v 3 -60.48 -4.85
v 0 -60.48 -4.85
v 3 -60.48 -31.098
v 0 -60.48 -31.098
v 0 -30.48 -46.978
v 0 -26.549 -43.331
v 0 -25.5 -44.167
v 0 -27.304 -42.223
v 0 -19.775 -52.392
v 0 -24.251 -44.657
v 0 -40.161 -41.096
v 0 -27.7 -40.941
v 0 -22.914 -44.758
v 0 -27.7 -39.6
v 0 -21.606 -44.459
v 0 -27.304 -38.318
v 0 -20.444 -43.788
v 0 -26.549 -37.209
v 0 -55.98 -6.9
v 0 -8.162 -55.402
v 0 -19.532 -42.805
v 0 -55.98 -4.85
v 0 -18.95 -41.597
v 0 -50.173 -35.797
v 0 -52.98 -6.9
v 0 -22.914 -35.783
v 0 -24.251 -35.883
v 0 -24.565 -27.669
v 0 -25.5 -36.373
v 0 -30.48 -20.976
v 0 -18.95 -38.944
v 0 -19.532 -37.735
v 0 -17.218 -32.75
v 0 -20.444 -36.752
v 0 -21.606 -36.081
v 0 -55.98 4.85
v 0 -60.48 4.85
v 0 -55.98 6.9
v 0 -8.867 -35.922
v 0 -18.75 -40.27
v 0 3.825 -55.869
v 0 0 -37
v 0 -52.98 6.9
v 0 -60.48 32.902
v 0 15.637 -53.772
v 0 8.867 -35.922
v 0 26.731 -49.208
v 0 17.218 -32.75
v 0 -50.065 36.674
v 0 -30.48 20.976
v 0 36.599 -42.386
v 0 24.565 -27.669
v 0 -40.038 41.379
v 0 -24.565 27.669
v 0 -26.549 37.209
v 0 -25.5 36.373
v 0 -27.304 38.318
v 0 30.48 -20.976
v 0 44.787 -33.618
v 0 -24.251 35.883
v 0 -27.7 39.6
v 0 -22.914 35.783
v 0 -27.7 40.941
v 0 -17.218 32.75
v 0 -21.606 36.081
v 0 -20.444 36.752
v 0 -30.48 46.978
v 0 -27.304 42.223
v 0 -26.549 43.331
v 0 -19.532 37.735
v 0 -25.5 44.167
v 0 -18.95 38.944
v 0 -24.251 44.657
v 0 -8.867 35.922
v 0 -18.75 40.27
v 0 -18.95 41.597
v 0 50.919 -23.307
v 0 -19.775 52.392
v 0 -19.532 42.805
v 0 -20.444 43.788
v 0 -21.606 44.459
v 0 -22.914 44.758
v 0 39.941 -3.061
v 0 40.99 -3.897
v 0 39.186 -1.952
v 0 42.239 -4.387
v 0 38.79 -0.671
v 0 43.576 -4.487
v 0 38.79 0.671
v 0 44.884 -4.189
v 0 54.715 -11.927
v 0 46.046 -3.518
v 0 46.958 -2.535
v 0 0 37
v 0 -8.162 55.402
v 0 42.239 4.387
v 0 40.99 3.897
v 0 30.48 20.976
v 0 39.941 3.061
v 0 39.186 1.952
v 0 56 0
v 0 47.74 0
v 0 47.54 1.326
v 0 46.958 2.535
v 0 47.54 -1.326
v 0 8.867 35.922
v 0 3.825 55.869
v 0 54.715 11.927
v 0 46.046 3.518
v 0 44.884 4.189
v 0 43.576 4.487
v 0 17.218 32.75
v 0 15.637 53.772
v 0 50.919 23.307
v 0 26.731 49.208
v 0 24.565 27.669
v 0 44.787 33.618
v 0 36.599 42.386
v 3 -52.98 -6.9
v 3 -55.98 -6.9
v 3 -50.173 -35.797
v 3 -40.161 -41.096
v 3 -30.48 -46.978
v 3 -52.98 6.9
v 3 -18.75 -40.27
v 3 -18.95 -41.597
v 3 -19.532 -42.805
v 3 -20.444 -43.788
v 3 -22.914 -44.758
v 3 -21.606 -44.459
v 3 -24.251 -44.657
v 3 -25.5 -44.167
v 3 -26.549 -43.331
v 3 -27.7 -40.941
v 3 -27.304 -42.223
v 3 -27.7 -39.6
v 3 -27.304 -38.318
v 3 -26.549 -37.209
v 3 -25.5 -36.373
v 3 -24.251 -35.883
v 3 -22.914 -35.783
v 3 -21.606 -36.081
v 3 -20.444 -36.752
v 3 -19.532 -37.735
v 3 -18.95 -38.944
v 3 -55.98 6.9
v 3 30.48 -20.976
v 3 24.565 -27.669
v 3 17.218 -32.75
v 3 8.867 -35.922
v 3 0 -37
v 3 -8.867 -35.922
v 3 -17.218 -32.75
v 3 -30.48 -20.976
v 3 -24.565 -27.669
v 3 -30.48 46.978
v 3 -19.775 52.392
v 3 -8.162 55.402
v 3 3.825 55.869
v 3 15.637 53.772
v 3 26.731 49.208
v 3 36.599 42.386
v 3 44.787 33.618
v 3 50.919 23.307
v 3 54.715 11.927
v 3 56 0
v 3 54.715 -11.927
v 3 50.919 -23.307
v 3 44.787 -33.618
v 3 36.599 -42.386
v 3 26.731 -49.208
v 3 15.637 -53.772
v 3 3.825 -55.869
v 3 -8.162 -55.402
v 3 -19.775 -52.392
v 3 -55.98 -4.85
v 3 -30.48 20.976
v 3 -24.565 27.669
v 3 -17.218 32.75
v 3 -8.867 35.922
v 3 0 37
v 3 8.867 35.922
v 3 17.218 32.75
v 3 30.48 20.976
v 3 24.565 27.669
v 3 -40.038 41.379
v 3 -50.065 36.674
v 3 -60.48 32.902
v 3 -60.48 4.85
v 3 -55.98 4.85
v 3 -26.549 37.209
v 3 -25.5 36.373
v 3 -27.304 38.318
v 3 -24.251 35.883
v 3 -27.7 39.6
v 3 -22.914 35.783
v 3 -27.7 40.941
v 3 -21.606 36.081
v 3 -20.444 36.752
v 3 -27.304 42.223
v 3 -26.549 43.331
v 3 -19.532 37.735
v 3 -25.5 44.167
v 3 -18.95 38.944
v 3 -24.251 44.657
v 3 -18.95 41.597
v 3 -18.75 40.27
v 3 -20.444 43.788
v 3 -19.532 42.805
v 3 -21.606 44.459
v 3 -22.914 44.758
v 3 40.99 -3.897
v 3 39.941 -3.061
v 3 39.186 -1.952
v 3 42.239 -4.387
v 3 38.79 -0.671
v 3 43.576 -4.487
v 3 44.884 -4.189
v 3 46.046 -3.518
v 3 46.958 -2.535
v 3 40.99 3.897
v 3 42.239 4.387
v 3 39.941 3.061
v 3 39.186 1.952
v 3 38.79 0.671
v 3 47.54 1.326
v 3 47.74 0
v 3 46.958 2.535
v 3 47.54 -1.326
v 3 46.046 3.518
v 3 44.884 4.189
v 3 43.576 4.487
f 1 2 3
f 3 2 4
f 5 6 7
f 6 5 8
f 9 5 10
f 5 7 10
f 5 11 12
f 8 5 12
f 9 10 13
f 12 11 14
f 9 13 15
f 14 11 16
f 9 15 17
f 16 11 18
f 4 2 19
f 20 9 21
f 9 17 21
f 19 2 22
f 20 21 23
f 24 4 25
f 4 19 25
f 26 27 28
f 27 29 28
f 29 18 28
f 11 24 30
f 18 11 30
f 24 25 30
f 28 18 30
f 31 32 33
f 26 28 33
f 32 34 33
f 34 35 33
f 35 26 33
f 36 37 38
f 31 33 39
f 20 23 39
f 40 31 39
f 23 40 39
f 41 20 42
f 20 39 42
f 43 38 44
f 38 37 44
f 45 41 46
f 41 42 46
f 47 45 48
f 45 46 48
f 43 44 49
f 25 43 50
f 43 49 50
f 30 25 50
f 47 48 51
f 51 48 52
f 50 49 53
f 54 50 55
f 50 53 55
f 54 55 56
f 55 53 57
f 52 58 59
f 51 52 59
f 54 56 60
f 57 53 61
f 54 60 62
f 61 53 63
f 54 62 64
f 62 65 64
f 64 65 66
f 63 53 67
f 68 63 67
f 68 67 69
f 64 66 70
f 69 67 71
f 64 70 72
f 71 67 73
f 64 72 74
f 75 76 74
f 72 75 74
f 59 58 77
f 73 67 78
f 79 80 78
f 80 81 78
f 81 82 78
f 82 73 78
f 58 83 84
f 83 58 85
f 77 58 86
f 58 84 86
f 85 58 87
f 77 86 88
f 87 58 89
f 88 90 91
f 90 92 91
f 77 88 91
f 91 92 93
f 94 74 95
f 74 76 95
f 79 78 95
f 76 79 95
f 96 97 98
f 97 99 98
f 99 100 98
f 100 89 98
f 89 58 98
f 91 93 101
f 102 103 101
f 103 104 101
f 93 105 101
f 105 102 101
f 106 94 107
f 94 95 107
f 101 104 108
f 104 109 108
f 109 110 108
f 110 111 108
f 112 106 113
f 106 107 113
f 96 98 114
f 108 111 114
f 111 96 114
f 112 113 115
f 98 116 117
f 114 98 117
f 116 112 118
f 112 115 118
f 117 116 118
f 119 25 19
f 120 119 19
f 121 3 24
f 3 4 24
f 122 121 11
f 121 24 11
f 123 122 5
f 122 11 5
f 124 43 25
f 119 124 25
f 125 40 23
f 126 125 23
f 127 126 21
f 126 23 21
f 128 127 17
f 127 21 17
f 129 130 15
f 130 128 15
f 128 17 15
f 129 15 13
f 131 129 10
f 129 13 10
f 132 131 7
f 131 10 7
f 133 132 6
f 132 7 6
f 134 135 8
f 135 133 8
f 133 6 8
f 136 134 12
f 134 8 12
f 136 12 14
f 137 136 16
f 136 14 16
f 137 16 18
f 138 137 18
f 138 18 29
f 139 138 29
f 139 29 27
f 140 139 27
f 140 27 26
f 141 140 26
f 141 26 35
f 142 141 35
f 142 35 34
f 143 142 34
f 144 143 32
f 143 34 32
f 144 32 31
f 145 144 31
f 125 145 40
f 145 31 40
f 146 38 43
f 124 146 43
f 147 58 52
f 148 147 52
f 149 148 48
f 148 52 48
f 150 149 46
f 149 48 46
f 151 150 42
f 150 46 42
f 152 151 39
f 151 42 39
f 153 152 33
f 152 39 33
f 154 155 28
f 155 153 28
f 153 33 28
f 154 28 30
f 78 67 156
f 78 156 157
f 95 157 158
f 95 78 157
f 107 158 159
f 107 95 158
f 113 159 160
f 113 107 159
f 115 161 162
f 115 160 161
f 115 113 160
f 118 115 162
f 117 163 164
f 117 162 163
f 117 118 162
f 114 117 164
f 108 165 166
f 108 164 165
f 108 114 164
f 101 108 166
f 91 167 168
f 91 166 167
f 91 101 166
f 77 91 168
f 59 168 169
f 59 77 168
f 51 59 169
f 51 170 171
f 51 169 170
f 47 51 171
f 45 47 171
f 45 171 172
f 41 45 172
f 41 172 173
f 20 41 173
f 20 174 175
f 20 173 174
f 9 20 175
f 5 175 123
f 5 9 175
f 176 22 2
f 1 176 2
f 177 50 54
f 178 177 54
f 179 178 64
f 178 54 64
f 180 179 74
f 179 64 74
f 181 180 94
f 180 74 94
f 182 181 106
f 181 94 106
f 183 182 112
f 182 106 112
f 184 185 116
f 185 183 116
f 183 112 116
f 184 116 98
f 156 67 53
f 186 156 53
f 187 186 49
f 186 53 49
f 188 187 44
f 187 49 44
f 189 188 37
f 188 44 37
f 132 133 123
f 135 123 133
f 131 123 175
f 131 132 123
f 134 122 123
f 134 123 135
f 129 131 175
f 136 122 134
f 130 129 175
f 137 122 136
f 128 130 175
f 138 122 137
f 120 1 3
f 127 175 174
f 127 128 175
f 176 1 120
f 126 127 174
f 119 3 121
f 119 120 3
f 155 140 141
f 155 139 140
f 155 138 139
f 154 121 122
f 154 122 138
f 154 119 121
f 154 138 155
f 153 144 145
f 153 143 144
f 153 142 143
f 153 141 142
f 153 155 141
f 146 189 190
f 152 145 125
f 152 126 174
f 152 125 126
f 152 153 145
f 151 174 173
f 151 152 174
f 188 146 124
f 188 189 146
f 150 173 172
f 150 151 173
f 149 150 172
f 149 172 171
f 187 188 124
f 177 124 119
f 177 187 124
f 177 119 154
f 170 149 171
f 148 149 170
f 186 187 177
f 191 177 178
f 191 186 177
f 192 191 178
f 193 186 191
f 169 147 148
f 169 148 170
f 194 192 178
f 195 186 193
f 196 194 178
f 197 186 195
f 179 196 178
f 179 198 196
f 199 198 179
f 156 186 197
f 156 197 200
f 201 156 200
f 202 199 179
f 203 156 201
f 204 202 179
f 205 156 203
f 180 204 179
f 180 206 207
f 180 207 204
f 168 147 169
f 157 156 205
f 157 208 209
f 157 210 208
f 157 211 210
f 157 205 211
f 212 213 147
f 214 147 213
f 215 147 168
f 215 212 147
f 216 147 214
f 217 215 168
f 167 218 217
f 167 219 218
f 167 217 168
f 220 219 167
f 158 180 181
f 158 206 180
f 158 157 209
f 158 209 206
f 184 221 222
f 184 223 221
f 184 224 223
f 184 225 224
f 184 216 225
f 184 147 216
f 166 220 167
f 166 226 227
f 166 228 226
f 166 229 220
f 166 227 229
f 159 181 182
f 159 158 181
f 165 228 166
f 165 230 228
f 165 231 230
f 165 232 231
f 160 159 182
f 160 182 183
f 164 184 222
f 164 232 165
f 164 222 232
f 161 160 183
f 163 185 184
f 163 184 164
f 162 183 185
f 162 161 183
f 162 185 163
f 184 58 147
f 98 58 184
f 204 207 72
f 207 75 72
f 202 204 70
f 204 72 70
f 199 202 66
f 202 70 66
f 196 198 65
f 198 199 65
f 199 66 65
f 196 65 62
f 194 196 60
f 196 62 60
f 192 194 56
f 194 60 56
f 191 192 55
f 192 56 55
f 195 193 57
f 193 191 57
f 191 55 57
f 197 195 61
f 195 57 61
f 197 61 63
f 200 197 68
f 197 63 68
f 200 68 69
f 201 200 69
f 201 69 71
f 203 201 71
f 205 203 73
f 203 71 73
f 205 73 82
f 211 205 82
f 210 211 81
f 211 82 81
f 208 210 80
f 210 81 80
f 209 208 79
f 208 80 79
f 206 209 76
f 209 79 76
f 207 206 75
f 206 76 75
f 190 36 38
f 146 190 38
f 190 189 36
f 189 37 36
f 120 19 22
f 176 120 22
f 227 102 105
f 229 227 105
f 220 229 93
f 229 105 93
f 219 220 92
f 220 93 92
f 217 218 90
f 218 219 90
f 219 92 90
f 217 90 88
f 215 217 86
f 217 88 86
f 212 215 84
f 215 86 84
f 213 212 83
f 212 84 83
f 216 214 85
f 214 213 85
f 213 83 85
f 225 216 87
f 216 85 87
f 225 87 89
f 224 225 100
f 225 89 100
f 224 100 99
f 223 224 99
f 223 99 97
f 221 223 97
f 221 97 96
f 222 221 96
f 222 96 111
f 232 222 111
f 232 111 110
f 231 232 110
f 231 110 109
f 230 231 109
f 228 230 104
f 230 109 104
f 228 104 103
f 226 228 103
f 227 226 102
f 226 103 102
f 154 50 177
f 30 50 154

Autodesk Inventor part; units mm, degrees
ref_plane "YZ Plane" through (0, 0, 0) normal (1, 0, 0) x (0, 1, 0)
ref_plane "XZ Plane" through (0, 0, 0) normal (0, 1, 0) x (-1, 0, 0)
ref_plane "XY Plane" through (0, 0, 0) normal (0, 0, 1) x (1, 0, 0)
sketch "Sketch1" plane through (0, 0, 0) normal (1, 0, 0) x (0, 1, 0)
  line L0 (30.48, -20.9755) -> (30.48, 20.9755)
  line L1 (-30.48, 20.9755) -> (-30.48, -20.9755)
  arc A0 (30.48, 20.9755) -> (-30.48, 20.9755) centre (0, 0) ccw
  arc A1 (-30.48, -20.9755) -> (30.48, -20.9755) centre (0, 0) ccw
  arc A2 (-30.48, -46.9784) -> (-30.48, 46.9784) centre (0, 0) ccw
  arc A3 (-60.48, 32.902) -> (-30.48, 46.9784) centre (-96.5998, 148.8879) ccw
  arc A4 (-30.48, -46.9784) -> (-60.48, -31.098) centre (-134.7727, -207.7233) ccw
  line L2 (56, 0) -> (0, 0) construction
  line L3 (0, 0) -> (-28, 48.4974) construction
  line L4 (0, 0) -> (-28, -48.4974) construction
  line L5 (30.48, 0) -> (56, 0) construction
  line L6 (-18.5, -32.0429) -> (-28, -48.4974) construction
  line L7 (-28, 48.4974) -> (-18.5, 32.0429) construction
  circle A5 centre (43.24, 0) radius 4.5
  circle A6 centre (-23.25, -40.2702) radius 4.5
  circle A7 centre (-23.25, 40.2702) radius 4.5
  line L8 (-60.48, 4.85) -> (-55.98, 4.85)
  line L9 (-55.98, 4.85) -> (-55.98, 6.9)
  line L10 (-55.98, 6.9) -> (-52.98, 6.9)
  line L11 (-52.98, 6.9) -> (-52.98, -6.9)
  line L12 (-52.98, -6.9) -> (-55.98, -6.9)
  line L13 (-55.98, -6.9) -> (-55.98, -4.85)
  line L14 (-55.98, -4.85) -> (-60.48, -4.85)
  line L15 (-60.48, 32.902) -> (-60.48, 4.85)
  line L16 (-60.48, -4.85) -> (-60.48, -31.098)
  point P0 (-72.3678, 0)
  point P1 (-30.48, 0)
  point P2 (-52.98, 0)
  dimension "d1" = 60.96
  dimension "d2" = 30.48
  dimension "d3" = 37
  dimension "d4" = 37
  dimension "d5" = 19
  dimension "d6" = 64
  dimension "d7" = 120
  dimension "d8" = 120
  dimension "d9" = 9
  dimension "d10" = 9
  dimension "d11" = 9
  dimension "d14" = 9.7
  dimension "d15" = 13.8
  dimension "d16" = 4.85
  dimension "d17" = 7.5
  dimension "d18" = 4.5
  dimension "d19" = 30
  dimension "d20" = 30
extrude "Extrusion1" add sketch "Sketch1" along normal blind 3
properties part number "inner"
